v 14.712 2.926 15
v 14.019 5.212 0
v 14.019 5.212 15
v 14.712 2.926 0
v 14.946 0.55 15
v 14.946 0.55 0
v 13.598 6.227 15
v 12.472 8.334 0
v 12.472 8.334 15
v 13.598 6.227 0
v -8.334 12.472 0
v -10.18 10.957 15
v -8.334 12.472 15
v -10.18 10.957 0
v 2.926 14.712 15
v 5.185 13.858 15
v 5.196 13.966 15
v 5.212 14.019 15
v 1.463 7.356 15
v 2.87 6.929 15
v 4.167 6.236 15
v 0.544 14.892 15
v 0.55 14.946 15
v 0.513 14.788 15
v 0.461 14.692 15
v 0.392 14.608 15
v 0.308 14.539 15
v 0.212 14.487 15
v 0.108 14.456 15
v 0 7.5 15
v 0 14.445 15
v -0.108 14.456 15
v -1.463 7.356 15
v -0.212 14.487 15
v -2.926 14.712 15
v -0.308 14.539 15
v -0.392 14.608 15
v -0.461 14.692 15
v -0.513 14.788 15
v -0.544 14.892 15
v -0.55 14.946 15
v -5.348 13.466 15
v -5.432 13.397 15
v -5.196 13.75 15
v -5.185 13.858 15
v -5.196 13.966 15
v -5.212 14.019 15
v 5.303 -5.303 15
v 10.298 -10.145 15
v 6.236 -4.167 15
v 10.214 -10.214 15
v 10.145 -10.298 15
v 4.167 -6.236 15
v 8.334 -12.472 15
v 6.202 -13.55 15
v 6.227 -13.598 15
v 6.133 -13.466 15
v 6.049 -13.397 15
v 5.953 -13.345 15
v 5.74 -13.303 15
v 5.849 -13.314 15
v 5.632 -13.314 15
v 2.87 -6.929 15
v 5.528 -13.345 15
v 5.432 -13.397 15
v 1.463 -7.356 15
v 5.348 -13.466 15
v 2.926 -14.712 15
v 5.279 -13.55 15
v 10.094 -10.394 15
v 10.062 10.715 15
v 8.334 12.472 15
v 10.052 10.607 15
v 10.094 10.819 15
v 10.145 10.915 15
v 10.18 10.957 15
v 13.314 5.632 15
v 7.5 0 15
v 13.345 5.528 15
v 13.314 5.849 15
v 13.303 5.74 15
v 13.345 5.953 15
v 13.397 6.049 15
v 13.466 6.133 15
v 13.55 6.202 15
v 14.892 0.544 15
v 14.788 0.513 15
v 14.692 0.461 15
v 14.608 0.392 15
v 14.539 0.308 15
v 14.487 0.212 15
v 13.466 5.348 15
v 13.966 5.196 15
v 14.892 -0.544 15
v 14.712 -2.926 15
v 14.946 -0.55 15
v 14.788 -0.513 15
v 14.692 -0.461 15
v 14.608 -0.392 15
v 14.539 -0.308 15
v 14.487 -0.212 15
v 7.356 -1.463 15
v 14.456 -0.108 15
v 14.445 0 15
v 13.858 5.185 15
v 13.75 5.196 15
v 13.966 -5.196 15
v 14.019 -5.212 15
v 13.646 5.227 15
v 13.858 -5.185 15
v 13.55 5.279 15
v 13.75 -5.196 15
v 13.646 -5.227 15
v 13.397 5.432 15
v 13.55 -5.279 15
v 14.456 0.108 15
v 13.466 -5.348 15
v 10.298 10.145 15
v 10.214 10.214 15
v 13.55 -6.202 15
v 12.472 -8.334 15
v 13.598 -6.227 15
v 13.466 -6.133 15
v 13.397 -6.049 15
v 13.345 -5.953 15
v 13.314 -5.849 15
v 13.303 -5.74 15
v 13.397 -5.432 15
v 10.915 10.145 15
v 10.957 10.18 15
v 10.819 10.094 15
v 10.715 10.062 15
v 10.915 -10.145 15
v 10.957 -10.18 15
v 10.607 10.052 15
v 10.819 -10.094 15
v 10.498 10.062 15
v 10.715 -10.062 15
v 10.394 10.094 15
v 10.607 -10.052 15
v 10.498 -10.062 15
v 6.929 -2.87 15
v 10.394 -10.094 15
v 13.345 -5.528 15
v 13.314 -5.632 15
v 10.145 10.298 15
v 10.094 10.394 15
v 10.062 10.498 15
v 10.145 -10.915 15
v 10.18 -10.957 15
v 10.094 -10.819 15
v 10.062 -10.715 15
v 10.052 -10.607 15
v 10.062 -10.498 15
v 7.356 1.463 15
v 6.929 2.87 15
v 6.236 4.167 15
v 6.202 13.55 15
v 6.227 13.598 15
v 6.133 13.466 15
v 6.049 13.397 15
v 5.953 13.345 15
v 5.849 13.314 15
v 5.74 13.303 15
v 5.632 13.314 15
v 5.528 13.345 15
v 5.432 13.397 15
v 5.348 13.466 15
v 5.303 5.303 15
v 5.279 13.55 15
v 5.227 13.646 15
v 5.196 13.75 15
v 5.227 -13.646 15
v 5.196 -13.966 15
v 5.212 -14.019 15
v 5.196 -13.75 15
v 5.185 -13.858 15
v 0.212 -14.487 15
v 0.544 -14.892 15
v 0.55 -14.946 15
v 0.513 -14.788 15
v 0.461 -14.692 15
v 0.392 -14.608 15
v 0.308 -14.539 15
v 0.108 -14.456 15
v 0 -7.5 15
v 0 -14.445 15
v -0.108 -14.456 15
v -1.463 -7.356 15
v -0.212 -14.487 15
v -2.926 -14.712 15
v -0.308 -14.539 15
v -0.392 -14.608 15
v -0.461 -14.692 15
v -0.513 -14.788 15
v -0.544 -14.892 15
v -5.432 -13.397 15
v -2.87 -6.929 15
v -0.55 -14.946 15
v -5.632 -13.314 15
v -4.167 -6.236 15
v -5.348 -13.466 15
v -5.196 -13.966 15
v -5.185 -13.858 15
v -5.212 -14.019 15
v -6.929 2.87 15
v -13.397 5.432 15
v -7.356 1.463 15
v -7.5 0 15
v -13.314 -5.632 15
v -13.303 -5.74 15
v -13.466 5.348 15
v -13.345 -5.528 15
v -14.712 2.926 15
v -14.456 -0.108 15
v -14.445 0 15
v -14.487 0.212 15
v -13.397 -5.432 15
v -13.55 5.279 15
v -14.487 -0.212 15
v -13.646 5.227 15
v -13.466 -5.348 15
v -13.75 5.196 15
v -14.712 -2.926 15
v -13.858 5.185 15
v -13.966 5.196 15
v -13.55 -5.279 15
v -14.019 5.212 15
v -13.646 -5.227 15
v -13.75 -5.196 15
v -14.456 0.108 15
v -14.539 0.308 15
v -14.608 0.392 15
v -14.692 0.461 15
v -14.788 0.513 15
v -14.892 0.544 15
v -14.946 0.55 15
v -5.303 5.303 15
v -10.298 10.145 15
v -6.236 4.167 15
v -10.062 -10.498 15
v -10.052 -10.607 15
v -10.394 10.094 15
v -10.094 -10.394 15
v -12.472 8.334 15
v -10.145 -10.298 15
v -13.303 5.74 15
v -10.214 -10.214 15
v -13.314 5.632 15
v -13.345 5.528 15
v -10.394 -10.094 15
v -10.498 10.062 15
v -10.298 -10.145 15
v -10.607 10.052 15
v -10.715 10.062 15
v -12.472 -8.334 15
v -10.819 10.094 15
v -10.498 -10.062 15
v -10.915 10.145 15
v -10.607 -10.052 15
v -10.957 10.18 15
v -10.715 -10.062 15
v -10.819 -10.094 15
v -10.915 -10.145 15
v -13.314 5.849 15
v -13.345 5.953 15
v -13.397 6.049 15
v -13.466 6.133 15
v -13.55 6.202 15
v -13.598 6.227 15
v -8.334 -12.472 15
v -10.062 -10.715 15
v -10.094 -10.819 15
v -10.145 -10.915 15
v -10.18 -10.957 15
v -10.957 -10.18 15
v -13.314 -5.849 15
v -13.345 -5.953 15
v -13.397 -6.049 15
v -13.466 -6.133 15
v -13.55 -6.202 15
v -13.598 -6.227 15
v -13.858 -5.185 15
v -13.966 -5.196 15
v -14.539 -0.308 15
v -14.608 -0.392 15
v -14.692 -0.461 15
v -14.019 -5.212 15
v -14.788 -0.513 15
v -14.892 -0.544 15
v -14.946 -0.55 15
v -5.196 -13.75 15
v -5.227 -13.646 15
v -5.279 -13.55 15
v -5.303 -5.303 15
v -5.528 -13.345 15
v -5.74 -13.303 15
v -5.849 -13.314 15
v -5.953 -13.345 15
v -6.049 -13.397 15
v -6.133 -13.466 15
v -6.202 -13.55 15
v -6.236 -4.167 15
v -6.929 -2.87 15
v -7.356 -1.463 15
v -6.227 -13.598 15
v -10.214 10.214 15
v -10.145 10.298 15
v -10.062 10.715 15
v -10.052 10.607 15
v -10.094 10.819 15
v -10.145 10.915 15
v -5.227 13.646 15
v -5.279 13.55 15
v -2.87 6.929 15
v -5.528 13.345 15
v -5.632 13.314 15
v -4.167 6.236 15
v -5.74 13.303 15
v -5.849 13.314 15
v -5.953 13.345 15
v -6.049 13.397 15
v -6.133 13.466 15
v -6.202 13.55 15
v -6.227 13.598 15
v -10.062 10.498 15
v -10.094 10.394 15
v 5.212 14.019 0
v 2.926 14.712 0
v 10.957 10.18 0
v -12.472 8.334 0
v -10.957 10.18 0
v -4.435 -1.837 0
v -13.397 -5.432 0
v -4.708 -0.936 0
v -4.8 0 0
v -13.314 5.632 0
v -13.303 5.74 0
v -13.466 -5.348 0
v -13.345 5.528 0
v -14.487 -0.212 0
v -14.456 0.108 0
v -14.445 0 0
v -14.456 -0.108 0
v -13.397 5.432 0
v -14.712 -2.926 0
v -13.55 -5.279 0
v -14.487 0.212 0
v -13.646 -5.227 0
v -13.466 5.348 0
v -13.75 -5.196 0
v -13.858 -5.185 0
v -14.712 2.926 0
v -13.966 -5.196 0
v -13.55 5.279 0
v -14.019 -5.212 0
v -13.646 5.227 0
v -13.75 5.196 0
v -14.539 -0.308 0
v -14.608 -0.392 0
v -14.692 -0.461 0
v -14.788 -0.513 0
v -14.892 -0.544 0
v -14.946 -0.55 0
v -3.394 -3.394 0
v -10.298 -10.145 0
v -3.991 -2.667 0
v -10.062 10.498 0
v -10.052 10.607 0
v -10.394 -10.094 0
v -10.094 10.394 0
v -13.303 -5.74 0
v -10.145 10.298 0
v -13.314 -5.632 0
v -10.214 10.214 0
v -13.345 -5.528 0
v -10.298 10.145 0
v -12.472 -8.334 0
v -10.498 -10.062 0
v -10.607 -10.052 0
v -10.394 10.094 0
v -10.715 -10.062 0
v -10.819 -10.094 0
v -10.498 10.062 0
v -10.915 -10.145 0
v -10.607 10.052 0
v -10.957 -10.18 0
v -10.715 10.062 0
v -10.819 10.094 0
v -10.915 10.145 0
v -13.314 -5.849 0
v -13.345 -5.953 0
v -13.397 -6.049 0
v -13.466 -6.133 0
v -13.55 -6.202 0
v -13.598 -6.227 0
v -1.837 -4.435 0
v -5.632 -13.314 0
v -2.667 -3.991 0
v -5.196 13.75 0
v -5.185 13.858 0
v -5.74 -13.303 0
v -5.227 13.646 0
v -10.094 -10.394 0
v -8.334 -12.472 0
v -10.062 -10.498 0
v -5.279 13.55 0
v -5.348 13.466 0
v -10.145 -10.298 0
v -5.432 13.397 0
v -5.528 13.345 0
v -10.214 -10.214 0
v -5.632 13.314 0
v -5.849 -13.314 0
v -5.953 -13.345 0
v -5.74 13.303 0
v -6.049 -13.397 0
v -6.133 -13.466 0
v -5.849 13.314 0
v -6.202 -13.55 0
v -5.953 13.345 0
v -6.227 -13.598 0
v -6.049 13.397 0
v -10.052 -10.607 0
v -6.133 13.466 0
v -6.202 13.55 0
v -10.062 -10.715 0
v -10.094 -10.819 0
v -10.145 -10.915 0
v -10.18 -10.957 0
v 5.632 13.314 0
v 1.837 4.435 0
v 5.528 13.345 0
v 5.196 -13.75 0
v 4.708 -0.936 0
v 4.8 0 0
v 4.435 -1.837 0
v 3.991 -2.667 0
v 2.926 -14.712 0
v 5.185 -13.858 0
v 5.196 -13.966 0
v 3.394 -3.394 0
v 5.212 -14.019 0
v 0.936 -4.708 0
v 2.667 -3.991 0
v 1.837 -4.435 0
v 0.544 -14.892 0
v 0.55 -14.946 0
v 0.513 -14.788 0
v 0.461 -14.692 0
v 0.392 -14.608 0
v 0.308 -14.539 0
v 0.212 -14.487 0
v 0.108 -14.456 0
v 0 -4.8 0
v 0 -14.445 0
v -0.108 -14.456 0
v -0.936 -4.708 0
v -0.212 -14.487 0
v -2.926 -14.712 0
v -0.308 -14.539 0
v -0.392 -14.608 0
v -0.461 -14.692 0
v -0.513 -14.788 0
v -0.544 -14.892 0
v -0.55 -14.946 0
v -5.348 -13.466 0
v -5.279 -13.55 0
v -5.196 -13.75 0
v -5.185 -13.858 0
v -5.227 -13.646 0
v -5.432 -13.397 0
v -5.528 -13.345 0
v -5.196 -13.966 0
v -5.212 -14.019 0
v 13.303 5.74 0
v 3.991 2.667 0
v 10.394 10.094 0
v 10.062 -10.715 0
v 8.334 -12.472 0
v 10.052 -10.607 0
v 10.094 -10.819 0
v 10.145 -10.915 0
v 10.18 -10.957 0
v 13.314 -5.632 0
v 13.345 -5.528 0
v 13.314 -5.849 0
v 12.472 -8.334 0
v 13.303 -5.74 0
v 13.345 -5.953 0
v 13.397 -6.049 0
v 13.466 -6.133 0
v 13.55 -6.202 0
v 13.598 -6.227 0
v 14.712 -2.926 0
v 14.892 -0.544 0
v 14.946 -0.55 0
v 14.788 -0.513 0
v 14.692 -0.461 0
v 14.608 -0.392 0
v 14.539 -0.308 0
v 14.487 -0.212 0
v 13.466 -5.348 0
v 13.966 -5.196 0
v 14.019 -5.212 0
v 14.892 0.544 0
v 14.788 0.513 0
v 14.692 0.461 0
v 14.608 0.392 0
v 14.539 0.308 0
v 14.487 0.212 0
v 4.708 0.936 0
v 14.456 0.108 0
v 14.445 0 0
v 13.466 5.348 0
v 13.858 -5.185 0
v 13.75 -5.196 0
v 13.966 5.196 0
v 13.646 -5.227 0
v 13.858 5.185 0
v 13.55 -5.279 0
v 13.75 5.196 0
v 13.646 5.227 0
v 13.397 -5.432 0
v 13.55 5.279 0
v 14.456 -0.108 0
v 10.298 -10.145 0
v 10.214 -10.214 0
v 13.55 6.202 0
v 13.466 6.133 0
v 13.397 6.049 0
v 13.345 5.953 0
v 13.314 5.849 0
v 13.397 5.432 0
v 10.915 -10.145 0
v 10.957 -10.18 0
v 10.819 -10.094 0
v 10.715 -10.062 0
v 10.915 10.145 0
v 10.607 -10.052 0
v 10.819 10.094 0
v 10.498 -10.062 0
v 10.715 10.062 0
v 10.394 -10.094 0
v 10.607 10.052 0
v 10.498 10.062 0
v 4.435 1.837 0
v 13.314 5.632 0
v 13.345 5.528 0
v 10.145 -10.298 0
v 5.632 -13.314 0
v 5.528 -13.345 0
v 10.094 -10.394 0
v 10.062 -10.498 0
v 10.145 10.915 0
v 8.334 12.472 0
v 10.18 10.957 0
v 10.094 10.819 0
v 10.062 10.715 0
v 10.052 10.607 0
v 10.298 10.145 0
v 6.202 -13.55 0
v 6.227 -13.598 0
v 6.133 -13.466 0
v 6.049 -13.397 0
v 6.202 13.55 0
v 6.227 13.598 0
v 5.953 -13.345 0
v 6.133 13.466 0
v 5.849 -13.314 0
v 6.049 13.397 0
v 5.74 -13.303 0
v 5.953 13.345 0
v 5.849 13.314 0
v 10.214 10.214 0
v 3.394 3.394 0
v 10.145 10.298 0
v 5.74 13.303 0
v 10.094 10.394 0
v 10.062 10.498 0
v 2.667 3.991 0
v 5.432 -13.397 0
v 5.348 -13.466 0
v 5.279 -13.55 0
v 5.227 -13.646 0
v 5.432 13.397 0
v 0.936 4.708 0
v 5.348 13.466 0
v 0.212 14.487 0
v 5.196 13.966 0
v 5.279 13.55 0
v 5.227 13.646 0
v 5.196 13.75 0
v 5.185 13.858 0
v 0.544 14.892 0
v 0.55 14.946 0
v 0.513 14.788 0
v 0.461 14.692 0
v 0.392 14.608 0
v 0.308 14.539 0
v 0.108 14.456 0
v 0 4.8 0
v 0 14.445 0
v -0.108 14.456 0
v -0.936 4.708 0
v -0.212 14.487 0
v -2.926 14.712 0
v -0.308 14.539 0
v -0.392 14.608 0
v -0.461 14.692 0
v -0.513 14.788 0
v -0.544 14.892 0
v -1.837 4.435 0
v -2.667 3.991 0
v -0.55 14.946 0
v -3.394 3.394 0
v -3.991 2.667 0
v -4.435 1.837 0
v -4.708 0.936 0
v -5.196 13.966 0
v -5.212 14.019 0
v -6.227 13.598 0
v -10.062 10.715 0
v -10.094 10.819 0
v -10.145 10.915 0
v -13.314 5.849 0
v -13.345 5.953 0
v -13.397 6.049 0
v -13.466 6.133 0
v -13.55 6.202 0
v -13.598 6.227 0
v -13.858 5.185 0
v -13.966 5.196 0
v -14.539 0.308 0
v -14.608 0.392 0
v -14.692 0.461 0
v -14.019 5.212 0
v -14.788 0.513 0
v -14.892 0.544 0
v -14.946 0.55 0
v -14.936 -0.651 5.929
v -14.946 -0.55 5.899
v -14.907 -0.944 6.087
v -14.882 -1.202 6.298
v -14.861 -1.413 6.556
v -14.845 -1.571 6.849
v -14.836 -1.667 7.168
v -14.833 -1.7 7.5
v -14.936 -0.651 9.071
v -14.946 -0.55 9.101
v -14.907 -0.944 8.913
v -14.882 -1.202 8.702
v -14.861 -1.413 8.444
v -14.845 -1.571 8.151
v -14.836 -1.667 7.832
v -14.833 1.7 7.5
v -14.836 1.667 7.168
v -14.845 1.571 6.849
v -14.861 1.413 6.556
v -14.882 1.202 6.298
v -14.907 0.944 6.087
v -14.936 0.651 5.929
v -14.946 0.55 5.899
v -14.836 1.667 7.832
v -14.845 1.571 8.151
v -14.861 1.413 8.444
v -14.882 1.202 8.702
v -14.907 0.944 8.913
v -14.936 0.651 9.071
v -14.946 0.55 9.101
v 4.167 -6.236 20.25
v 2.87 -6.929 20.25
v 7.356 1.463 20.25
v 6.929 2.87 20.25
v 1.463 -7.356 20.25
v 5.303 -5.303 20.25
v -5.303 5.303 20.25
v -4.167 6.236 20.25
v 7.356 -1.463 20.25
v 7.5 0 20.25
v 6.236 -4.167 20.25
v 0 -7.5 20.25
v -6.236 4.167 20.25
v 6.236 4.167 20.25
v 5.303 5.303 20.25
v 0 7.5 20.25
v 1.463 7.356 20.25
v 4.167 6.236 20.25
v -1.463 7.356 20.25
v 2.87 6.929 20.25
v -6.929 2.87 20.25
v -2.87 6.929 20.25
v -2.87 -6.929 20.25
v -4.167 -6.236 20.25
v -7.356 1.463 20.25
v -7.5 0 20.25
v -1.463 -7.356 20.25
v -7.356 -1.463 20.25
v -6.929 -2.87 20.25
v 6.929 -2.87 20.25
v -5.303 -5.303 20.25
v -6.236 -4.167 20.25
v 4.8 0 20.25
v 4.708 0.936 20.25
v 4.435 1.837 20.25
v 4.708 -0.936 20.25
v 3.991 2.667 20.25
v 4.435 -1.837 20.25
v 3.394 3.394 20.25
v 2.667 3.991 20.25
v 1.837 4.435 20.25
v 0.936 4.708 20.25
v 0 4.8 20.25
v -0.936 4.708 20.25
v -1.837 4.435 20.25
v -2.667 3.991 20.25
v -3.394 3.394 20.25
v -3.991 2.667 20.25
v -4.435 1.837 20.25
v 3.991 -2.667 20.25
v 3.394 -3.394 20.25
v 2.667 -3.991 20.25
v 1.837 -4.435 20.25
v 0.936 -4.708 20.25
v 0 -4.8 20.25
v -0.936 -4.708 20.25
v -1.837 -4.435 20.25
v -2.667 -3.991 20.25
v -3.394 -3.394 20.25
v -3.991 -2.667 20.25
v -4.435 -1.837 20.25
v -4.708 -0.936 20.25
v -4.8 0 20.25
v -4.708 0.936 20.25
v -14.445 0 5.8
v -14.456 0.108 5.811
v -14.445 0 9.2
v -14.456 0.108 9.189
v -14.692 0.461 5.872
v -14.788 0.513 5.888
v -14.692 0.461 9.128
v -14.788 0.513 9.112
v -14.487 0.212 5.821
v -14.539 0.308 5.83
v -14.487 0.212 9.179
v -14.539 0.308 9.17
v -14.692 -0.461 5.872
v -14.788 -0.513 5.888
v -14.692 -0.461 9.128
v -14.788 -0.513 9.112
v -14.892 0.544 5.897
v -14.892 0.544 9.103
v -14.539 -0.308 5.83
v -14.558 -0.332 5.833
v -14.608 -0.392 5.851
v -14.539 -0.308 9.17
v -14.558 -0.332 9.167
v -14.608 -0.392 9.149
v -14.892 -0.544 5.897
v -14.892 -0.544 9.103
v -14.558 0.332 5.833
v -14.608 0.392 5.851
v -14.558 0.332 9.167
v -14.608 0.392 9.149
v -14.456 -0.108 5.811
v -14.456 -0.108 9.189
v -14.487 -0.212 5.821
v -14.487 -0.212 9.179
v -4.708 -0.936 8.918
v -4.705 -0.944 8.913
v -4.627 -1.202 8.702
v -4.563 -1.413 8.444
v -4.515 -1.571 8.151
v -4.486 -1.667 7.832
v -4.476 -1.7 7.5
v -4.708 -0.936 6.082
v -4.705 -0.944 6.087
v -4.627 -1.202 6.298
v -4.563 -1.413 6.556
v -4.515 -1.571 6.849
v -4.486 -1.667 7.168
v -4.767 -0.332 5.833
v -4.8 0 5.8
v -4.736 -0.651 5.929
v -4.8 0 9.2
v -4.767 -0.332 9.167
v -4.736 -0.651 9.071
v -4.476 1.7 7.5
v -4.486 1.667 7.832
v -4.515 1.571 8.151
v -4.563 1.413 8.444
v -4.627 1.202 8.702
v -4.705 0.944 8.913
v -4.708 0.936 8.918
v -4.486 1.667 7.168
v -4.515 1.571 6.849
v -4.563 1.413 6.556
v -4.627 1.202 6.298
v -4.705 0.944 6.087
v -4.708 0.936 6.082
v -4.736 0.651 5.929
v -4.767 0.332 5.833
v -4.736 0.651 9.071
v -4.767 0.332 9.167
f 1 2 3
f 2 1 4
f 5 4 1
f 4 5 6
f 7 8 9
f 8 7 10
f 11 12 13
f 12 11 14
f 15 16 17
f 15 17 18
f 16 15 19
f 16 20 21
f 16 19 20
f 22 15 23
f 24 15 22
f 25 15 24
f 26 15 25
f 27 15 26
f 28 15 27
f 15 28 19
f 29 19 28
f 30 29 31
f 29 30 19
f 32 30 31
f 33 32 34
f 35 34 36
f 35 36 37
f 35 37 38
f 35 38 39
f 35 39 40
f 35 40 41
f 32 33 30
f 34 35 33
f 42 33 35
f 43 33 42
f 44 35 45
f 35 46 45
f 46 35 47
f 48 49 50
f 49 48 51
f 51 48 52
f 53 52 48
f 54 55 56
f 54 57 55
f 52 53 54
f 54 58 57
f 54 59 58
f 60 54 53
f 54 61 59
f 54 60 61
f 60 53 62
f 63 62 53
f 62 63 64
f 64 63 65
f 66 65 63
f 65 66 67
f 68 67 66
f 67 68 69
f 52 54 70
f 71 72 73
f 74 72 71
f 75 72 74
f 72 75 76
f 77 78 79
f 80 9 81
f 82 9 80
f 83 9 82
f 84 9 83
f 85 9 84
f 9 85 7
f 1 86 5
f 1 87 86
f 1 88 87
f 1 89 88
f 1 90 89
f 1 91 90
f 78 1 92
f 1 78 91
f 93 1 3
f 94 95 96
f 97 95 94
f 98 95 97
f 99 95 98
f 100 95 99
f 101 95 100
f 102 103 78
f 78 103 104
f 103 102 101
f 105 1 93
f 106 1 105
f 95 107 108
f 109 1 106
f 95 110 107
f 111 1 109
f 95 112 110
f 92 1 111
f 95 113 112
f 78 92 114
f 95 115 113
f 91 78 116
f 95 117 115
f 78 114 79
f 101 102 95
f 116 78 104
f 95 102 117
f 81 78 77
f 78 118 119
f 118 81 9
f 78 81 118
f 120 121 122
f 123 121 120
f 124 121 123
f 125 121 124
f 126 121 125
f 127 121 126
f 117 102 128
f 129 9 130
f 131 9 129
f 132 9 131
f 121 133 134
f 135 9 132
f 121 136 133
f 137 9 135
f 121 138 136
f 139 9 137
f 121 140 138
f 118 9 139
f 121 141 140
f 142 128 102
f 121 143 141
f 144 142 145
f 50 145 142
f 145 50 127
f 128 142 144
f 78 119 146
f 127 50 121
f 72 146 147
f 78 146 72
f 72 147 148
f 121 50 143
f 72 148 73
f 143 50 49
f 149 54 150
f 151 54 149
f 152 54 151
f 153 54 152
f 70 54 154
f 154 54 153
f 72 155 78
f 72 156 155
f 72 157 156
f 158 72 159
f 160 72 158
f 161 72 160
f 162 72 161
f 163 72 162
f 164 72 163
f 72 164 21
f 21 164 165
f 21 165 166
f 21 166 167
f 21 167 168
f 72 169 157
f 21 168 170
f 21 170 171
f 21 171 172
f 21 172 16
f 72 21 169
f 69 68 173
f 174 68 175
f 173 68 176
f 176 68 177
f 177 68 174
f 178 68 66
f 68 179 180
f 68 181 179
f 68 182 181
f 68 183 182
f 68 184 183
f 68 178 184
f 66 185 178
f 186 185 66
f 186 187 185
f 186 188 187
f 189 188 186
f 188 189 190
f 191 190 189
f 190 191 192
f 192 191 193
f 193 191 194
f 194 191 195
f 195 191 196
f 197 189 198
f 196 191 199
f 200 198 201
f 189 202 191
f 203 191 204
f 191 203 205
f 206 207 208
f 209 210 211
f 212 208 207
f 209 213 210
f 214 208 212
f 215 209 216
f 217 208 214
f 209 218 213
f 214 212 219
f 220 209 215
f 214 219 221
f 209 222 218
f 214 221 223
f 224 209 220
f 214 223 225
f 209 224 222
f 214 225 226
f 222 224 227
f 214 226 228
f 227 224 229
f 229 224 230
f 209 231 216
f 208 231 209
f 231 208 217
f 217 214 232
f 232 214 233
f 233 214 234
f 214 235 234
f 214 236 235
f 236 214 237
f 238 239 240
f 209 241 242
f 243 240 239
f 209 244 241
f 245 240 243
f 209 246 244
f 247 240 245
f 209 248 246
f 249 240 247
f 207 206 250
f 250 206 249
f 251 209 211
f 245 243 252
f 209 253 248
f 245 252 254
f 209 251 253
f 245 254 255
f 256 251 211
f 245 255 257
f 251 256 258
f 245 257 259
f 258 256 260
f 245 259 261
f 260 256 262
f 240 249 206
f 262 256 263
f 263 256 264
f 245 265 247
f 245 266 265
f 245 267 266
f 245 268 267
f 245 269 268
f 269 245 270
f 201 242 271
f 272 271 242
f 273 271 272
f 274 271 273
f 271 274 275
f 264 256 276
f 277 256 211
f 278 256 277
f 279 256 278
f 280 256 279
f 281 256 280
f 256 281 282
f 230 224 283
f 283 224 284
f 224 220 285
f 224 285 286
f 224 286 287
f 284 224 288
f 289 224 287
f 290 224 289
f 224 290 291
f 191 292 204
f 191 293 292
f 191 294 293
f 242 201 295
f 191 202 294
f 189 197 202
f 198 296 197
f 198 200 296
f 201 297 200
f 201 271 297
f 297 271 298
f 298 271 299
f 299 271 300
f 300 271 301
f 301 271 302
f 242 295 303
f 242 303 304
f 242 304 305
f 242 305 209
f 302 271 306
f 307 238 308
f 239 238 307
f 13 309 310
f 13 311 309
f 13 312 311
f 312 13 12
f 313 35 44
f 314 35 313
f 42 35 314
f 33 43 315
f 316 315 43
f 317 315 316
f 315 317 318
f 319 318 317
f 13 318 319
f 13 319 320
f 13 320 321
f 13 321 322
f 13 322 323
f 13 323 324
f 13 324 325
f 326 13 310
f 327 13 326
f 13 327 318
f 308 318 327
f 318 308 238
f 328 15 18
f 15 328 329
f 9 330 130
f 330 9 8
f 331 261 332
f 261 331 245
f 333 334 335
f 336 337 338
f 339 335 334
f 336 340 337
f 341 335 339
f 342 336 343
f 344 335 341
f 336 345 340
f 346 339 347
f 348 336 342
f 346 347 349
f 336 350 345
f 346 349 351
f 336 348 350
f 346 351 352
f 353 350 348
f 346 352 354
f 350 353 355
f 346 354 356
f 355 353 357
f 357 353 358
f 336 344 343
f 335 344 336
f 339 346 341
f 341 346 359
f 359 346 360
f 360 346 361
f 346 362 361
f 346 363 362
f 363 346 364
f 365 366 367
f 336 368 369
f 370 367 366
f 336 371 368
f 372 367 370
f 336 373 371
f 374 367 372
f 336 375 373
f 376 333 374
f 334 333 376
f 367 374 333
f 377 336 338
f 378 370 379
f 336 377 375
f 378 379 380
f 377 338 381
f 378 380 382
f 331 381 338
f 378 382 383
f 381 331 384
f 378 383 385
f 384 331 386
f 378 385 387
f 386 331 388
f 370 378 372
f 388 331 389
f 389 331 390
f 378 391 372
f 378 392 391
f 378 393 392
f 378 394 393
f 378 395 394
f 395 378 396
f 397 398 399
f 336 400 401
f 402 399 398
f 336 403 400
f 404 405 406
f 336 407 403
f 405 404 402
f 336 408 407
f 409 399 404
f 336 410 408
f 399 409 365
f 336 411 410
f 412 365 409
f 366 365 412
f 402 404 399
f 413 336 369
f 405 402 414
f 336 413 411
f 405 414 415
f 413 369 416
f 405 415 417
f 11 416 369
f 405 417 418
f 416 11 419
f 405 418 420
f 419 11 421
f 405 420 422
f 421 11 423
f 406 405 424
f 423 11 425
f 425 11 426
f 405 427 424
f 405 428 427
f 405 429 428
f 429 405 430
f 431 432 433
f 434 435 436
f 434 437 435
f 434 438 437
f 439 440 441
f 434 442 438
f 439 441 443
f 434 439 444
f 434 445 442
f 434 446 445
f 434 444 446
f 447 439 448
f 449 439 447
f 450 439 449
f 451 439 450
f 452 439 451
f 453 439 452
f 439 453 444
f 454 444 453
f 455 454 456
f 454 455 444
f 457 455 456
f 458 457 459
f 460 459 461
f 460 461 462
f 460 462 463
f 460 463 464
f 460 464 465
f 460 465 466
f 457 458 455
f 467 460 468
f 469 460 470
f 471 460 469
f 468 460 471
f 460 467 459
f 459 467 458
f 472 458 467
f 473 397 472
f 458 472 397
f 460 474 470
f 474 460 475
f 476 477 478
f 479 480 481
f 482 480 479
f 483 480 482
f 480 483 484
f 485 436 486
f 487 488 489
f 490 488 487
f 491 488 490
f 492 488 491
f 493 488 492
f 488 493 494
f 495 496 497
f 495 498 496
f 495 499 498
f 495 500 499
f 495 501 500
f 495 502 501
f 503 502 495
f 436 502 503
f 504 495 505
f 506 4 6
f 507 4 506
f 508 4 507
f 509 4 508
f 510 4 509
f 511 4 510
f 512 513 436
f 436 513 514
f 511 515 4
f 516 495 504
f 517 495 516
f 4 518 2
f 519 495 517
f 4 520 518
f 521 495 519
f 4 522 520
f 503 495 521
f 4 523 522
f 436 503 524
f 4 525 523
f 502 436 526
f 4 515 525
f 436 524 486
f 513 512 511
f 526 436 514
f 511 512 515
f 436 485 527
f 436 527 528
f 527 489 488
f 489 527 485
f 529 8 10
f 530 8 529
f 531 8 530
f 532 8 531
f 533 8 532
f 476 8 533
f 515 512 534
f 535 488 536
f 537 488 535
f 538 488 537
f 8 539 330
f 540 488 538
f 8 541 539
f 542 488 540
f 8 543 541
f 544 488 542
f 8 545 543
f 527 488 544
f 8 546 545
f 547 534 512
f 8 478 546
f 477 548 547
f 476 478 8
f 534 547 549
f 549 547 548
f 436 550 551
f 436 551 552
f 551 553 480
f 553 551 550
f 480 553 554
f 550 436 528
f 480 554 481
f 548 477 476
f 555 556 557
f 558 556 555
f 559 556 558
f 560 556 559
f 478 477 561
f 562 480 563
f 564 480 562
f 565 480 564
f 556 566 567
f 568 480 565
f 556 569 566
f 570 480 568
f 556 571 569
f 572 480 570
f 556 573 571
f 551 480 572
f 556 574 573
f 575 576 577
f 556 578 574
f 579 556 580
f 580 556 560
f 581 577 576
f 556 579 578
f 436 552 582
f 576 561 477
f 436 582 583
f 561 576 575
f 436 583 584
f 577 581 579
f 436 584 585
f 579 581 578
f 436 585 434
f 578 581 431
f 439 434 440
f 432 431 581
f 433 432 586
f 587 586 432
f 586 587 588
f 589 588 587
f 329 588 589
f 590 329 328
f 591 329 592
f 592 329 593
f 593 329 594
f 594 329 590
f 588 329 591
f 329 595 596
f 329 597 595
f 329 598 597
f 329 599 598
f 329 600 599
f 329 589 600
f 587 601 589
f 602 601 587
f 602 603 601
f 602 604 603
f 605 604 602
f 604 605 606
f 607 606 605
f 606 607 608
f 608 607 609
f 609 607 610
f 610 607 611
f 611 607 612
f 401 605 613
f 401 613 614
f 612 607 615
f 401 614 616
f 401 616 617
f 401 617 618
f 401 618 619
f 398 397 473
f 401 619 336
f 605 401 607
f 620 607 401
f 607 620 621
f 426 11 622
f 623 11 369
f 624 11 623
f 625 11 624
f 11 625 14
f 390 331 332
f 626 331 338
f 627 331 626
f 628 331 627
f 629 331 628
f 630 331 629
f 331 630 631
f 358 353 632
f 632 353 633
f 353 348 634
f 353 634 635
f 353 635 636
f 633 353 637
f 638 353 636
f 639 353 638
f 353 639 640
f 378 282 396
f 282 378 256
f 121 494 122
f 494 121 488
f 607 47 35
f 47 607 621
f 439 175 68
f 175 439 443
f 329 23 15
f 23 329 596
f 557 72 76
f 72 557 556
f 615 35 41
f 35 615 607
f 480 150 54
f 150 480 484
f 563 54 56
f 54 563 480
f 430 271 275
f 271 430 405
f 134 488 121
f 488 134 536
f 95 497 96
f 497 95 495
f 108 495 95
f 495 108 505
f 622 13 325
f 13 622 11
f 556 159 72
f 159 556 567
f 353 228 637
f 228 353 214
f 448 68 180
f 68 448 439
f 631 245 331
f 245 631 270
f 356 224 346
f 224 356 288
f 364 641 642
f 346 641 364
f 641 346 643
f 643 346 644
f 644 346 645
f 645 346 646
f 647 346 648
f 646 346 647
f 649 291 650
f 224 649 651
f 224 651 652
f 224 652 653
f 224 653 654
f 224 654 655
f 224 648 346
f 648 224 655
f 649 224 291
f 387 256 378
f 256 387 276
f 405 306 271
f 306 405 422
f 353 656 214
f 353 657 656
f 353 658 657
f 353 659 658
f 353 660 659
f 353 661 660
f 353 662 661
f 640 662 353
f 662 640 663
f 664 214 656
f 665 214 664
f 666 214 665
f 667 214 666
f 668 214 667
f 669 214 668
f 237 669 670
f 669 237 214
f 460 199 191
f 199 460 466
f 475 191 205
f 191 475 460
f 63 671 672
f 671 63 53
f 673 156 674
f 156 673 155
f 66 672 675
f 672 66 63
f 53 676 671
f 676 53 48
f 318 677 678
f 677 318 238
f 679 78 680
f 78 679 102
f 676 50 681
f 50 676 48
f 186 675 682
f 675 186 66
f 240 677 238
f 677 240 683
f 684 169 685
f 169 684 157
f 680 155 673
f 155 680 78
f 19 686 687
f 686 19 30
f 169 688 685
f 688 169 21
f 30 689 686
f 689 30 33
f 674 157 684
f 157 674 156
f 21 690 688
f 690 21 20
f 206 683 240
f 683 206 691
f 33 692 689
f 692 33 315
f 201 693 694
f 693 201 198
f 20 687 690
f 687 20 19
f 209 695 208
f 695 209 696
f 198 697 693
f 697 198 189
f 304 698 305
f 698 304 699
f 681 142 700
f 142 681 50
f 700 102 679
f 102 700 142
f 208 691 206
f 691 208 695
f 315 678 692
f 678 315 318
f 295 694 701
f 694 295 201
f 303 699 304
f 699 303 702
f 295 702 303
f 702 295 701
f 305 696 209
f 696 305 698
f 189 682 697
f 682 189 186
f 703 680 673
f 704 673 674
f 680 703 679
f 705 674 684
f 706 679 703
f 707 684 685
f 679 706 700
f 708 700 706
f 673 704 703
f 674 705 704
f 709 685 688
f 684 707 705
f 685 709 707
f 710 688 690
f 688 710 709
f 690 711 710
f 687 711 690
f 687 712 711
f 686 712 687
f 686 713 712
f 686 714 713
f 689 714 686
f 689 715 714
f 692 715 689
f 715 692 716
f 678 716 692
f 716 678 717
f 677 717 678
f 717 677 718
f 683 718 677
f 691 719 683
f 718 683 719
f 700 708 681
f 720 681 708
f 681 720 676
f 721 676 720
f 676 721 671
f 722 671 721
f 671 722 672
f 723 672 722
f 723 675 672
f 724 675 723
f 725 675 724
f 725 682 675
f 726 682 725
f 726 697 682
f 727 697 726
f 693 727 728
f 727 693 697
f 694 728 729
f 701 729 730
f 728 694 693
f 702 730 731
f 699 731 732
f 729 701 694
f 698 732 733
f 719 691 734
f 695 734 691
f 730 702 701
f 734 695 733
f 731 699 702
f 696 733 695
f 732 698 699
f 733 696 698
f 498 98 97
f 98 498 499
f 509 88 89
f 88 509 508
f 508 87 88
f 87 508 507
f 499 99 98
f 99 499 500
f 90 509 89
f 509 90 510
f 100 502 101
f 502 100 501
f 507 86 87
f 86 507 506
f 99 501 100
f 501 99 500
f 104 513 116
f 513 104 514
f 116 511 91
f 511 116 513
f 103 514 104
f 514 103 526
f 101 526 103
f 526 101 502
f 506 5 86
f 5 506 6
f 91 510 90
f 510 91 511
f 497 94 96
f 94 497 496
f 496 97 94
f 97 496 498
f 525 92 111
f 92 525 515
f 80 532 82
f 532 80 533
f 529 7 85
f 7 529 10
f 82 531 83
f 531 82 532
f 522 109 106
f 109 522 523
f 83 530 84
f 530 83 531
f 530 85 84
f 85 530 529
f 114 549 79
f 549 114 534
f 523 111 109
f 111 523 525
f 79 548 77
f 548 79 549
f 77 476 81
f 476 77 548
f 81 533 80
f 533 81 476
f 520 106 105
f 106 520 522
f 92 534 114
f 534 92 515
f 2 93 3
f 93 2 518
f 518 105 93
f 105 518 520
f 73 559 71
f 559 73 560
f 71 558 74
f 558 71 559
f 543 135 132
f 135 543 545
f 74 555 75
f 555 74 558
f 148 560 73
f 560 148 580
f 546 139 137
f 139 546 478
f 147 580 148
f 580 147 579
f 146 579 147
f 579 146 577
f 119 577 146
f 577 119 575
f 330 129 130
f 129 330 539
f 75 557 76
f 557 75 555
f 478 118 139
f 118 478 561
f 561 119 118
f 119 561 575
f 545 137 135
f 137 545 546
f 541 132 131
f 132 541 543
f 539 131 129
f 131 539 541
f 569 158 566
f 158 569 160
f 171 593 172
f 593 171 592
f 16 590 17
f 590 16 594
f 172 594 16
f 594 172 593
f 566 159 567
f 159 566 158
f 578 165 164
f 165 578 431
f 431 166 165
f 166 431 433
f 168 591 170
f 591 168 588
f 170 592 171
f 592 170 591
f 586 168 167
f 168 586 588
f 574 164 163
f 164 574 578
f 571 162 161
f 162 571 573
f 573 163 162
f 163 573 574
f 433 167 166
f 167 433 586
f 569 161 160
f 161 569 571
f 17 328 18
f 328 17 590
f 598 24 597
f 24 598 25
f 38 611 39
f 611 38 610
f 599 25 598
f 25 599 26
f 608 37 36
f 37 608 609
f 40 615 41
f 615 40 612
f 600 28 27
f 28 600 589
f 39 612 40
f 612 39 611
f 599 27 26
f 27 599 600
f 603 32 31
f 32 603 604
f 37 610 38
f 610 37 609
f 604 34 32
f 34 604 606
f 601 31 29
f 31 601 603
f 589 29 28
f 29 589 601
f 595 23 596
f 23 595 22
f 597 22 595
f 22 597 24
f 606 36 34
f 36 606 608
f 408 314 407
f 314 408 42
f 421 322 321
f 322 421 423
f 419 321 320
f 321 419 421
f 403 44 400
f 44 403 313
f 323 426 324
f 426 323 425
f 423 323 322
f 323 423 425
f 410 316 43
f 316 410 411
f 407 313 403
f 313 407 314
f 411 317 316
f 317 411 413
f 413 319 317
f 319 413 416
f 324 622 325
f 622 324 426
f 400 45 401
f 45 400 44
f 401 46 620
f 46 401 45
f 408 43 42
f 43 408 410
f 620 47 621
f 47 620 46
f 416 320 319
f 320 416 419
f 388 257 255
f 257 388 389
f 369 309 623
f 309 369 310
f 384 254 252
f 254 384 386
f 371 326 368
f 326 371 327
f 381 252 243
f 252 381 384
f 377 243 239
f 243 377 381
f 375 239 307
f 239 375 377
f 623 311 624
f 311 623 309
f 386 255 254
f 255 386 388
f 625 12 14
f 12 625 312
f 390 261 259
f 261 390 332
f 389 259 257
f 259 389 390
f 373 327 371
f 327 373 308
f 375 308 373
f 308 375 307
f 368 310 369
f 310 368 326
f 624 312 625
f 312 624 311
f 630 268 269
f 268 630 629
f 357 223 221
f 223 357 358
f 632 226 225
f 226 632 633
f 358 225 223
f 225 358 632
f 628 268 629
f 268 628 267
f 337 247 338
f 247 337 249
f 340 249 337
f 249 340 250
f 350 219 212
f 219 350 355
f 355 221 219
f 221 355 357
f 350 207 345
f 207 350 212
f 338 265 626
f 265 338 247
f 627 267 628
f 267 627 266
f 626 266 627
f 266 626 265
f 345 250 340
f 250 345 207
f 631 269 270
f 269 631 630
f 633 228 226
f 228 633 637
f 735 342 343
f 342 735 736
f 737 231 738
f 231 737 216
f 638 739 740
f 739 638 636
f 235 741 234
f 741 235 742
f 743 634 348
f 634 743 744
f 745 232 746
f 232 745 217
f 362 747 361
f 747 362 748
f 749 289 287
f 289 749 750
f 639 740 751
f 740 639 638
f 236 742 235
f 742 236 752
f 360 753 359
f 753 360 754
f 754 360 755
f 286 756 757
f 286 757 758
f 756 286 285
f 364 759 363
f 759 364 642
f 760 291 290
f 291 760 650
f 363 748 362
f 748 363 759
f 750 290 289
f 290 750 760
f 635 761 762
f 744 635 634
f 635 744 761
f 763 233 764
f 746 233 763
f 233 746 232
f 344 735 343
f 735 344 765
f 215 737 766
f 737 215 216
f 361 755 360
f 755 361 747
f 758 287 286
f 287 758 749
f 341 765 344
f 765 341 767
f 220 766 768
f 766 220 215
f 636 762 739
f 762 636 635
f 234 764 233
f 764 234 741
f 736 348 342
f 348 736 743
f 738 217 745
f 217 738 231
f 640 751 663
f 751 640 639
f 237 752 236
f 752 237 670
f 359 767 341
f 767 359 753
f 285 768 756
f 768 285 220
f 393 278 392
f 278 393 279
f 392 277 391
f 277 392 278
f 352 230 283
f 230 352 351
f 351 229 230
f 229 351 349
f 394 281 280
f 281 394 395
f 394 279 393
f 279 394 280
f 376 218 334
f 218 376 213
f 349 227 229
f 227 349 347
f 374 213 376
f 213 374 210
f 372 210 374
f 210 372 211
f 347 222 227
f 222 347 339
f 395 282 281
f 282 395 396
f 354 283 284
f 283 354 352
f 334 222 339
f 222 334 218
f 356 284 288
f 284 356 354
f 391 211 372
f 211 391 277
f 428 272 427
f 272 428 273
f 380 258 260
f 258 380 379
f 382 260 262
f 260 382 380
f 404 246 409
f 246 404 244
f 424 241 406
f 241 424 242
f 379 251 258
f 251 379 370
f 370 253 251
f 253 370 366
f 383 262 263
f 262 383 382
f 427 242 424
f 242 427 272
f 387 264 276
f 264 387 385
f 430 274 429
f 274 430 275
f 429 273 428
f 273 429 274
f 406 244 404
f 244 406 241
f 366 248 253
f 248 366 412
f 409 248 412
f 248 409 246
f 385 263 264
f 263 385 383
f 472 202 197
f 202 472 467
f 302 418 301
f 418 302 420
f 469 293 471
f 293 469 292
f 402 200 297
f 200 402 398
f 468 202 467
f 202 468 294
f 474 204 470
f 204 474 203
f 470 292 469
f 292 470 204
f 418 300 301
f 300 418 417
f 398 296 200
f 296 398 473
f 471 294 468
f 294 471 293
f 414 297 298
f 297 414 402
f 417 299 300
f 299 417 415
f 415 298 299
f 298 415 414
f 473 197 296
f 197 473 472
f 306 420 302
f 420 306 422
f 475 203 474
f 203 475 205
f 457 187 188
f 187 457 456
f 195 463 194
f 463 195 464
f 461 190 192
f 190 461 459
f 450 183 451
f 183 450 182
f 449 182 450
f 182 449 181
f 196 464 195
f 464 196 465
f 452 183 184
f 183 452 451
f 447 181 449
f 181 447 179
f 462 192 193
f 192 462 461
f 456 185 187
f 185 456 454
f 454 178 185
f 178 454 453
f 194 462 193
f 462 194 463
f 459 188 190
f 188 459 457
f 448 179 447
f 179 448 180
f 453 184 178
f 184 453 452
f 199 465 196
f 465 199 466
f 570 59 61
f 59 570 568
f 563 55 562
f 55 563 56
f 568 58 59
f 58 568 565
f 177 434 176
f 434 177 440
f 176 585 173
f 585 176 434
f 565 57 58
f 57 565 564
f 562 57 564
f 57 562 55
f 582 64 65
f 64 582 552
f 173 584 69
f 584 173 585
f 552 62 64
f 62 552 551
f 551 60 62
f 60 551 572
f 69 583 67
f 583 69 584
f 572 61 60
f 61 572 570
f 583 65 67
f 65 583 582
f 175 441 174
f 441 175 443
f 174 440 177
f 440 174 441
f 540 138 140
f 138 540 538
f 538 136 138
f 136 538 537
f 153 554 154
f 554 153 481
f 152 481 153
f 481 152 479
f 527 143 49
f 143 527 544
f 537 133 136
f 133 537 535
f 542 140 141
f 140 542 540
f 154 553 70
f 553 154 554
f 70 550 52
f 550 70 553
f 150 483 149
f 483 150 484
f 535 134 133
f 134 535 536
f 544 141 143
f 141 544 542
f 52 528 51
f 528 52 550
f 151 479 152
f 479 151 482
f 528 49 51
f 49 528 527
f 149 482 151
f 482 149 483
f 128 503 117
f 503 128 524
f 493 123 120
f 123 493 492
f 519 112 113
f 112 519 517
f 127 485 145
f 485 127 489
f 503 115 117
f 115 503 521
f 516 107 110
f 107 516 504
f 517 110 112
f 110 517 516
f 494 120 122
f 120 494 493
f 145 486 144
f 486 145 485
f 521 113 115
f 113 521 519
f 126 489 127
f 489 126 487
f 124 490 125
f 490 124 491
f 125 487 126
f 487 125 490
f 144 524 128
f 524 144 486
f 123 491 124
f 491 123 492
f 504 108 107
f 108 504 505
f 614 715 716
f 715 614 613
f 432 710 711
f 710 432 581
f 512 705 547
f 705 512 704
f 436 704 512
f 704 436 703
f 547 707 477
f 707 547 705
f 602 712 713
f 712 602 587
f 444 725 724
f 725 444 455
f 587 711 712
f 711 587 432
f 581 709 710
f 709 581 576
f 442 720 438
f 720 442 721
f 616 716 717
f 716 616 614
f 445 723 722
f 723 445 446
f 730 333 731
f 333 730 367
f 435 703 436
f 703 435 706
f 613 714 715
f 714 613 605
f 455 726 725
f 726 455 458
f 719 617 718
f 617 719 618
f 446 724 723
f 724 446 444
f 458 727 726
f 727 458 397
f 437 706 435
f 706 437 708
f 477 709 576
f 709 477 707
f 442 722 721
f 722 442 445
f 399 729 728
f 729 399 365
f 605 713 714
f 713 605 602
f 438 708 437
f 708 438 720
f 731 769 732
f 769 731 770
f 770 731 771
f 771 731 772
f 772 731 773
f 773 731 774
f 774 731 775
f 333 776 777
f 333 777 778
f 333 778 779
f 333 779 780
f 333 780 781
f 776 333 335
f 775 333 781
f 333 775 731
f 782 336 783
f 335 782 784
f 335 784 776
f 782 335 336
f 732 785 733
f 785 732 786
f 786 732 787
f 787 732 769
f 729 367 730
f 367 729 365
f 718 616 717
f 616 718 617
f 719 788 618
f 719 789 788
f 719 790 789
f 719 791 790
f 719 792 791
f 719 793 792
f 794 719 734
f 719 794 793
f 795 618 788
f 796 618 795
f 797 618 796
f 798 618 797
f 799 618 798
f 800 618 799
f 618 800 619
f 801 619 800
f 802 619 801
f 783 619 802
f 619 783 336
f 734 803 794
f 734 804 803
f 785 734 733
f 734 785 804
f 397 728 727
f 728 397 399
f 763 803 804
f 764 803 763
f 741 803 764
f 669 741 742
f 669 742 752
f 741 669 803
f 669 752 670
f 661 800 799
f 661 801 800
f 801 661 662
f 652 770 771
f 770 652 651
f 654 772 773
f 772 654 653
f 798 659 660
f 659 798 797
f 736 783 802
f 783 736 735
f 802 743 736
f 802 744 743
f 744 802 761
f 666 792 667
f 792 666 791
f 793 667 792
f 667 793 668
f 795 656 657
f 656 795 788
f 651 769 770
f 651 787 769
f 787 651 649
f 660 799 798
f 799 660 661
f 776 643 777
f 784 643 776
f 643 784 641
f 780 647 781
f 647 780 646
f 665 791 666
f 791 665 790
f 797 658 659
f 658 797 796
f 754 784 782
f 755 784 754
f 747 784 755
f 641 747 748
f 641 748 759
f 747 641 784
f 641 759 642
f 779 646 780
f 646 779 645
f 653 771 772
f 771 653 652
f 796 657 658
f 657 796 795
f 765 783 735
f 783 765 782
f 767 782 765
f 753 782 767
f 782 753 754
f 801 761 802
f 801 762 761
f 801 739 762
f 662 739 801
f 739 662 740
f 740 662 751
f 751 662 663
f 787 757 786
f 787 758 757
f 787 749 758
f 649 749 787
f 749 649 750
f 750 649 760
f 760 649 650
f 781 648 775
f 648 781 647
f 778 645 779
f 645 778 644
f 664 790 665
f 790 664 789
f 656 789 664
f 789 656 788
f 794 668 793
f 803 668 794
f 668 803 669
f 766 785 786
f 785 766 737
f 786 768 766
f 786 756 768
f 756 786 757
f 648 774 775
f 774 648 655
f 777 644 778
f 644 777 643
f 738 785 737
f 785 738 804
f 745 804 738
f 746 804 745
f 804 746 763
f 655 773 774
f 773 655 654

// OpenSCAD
$fn = 32;

// ----------------------------------------------------------------------
// Hand knob: 30 x 30 x 20.25 mm
// ----------------------------------------------------------------------

// --- parameters (mm) ---
head_d = 30;              // knob diameter
head_h = 15;              // knob height
hole_d = 9.6;             // shaft bore
set_d = 3.4;              // set screw tap hole
notch_d = 1.11;           // knurl groove diameter
knurl_n = 16;             // number of knurl grooves
cap_h = 5.25;             // raised centre cap
cap_d = 15;               // centre cap diameter

module body() {
  cylinder(h = head_h, d = head_d);
}

module cap() {
  translate([0, 0, head_h - 1]) cylinder(h = cap_h + 1, d = cap_d);
}

difference() {
  union() {
    body();
    cap();
  }
  translate([0, 0, -1]) cylinder(h = head_h + cap_h + 2, d = hole_d);
  /* knurl grooves */
  for (i = [0 : knurl_n - 1])
    rotate([0, 0, i * 360 / knurl_n])
      translate([head_d / 2, 0, -0.5])
        cylinder(h = head_h + 1, d = notch_d);
  translate([-head_d / 2 - 1, 0, head_h * 0.5]) rotate([0, 90, 0]) cylinder(h = head_d / 2 + 2, d = set_d);
}
